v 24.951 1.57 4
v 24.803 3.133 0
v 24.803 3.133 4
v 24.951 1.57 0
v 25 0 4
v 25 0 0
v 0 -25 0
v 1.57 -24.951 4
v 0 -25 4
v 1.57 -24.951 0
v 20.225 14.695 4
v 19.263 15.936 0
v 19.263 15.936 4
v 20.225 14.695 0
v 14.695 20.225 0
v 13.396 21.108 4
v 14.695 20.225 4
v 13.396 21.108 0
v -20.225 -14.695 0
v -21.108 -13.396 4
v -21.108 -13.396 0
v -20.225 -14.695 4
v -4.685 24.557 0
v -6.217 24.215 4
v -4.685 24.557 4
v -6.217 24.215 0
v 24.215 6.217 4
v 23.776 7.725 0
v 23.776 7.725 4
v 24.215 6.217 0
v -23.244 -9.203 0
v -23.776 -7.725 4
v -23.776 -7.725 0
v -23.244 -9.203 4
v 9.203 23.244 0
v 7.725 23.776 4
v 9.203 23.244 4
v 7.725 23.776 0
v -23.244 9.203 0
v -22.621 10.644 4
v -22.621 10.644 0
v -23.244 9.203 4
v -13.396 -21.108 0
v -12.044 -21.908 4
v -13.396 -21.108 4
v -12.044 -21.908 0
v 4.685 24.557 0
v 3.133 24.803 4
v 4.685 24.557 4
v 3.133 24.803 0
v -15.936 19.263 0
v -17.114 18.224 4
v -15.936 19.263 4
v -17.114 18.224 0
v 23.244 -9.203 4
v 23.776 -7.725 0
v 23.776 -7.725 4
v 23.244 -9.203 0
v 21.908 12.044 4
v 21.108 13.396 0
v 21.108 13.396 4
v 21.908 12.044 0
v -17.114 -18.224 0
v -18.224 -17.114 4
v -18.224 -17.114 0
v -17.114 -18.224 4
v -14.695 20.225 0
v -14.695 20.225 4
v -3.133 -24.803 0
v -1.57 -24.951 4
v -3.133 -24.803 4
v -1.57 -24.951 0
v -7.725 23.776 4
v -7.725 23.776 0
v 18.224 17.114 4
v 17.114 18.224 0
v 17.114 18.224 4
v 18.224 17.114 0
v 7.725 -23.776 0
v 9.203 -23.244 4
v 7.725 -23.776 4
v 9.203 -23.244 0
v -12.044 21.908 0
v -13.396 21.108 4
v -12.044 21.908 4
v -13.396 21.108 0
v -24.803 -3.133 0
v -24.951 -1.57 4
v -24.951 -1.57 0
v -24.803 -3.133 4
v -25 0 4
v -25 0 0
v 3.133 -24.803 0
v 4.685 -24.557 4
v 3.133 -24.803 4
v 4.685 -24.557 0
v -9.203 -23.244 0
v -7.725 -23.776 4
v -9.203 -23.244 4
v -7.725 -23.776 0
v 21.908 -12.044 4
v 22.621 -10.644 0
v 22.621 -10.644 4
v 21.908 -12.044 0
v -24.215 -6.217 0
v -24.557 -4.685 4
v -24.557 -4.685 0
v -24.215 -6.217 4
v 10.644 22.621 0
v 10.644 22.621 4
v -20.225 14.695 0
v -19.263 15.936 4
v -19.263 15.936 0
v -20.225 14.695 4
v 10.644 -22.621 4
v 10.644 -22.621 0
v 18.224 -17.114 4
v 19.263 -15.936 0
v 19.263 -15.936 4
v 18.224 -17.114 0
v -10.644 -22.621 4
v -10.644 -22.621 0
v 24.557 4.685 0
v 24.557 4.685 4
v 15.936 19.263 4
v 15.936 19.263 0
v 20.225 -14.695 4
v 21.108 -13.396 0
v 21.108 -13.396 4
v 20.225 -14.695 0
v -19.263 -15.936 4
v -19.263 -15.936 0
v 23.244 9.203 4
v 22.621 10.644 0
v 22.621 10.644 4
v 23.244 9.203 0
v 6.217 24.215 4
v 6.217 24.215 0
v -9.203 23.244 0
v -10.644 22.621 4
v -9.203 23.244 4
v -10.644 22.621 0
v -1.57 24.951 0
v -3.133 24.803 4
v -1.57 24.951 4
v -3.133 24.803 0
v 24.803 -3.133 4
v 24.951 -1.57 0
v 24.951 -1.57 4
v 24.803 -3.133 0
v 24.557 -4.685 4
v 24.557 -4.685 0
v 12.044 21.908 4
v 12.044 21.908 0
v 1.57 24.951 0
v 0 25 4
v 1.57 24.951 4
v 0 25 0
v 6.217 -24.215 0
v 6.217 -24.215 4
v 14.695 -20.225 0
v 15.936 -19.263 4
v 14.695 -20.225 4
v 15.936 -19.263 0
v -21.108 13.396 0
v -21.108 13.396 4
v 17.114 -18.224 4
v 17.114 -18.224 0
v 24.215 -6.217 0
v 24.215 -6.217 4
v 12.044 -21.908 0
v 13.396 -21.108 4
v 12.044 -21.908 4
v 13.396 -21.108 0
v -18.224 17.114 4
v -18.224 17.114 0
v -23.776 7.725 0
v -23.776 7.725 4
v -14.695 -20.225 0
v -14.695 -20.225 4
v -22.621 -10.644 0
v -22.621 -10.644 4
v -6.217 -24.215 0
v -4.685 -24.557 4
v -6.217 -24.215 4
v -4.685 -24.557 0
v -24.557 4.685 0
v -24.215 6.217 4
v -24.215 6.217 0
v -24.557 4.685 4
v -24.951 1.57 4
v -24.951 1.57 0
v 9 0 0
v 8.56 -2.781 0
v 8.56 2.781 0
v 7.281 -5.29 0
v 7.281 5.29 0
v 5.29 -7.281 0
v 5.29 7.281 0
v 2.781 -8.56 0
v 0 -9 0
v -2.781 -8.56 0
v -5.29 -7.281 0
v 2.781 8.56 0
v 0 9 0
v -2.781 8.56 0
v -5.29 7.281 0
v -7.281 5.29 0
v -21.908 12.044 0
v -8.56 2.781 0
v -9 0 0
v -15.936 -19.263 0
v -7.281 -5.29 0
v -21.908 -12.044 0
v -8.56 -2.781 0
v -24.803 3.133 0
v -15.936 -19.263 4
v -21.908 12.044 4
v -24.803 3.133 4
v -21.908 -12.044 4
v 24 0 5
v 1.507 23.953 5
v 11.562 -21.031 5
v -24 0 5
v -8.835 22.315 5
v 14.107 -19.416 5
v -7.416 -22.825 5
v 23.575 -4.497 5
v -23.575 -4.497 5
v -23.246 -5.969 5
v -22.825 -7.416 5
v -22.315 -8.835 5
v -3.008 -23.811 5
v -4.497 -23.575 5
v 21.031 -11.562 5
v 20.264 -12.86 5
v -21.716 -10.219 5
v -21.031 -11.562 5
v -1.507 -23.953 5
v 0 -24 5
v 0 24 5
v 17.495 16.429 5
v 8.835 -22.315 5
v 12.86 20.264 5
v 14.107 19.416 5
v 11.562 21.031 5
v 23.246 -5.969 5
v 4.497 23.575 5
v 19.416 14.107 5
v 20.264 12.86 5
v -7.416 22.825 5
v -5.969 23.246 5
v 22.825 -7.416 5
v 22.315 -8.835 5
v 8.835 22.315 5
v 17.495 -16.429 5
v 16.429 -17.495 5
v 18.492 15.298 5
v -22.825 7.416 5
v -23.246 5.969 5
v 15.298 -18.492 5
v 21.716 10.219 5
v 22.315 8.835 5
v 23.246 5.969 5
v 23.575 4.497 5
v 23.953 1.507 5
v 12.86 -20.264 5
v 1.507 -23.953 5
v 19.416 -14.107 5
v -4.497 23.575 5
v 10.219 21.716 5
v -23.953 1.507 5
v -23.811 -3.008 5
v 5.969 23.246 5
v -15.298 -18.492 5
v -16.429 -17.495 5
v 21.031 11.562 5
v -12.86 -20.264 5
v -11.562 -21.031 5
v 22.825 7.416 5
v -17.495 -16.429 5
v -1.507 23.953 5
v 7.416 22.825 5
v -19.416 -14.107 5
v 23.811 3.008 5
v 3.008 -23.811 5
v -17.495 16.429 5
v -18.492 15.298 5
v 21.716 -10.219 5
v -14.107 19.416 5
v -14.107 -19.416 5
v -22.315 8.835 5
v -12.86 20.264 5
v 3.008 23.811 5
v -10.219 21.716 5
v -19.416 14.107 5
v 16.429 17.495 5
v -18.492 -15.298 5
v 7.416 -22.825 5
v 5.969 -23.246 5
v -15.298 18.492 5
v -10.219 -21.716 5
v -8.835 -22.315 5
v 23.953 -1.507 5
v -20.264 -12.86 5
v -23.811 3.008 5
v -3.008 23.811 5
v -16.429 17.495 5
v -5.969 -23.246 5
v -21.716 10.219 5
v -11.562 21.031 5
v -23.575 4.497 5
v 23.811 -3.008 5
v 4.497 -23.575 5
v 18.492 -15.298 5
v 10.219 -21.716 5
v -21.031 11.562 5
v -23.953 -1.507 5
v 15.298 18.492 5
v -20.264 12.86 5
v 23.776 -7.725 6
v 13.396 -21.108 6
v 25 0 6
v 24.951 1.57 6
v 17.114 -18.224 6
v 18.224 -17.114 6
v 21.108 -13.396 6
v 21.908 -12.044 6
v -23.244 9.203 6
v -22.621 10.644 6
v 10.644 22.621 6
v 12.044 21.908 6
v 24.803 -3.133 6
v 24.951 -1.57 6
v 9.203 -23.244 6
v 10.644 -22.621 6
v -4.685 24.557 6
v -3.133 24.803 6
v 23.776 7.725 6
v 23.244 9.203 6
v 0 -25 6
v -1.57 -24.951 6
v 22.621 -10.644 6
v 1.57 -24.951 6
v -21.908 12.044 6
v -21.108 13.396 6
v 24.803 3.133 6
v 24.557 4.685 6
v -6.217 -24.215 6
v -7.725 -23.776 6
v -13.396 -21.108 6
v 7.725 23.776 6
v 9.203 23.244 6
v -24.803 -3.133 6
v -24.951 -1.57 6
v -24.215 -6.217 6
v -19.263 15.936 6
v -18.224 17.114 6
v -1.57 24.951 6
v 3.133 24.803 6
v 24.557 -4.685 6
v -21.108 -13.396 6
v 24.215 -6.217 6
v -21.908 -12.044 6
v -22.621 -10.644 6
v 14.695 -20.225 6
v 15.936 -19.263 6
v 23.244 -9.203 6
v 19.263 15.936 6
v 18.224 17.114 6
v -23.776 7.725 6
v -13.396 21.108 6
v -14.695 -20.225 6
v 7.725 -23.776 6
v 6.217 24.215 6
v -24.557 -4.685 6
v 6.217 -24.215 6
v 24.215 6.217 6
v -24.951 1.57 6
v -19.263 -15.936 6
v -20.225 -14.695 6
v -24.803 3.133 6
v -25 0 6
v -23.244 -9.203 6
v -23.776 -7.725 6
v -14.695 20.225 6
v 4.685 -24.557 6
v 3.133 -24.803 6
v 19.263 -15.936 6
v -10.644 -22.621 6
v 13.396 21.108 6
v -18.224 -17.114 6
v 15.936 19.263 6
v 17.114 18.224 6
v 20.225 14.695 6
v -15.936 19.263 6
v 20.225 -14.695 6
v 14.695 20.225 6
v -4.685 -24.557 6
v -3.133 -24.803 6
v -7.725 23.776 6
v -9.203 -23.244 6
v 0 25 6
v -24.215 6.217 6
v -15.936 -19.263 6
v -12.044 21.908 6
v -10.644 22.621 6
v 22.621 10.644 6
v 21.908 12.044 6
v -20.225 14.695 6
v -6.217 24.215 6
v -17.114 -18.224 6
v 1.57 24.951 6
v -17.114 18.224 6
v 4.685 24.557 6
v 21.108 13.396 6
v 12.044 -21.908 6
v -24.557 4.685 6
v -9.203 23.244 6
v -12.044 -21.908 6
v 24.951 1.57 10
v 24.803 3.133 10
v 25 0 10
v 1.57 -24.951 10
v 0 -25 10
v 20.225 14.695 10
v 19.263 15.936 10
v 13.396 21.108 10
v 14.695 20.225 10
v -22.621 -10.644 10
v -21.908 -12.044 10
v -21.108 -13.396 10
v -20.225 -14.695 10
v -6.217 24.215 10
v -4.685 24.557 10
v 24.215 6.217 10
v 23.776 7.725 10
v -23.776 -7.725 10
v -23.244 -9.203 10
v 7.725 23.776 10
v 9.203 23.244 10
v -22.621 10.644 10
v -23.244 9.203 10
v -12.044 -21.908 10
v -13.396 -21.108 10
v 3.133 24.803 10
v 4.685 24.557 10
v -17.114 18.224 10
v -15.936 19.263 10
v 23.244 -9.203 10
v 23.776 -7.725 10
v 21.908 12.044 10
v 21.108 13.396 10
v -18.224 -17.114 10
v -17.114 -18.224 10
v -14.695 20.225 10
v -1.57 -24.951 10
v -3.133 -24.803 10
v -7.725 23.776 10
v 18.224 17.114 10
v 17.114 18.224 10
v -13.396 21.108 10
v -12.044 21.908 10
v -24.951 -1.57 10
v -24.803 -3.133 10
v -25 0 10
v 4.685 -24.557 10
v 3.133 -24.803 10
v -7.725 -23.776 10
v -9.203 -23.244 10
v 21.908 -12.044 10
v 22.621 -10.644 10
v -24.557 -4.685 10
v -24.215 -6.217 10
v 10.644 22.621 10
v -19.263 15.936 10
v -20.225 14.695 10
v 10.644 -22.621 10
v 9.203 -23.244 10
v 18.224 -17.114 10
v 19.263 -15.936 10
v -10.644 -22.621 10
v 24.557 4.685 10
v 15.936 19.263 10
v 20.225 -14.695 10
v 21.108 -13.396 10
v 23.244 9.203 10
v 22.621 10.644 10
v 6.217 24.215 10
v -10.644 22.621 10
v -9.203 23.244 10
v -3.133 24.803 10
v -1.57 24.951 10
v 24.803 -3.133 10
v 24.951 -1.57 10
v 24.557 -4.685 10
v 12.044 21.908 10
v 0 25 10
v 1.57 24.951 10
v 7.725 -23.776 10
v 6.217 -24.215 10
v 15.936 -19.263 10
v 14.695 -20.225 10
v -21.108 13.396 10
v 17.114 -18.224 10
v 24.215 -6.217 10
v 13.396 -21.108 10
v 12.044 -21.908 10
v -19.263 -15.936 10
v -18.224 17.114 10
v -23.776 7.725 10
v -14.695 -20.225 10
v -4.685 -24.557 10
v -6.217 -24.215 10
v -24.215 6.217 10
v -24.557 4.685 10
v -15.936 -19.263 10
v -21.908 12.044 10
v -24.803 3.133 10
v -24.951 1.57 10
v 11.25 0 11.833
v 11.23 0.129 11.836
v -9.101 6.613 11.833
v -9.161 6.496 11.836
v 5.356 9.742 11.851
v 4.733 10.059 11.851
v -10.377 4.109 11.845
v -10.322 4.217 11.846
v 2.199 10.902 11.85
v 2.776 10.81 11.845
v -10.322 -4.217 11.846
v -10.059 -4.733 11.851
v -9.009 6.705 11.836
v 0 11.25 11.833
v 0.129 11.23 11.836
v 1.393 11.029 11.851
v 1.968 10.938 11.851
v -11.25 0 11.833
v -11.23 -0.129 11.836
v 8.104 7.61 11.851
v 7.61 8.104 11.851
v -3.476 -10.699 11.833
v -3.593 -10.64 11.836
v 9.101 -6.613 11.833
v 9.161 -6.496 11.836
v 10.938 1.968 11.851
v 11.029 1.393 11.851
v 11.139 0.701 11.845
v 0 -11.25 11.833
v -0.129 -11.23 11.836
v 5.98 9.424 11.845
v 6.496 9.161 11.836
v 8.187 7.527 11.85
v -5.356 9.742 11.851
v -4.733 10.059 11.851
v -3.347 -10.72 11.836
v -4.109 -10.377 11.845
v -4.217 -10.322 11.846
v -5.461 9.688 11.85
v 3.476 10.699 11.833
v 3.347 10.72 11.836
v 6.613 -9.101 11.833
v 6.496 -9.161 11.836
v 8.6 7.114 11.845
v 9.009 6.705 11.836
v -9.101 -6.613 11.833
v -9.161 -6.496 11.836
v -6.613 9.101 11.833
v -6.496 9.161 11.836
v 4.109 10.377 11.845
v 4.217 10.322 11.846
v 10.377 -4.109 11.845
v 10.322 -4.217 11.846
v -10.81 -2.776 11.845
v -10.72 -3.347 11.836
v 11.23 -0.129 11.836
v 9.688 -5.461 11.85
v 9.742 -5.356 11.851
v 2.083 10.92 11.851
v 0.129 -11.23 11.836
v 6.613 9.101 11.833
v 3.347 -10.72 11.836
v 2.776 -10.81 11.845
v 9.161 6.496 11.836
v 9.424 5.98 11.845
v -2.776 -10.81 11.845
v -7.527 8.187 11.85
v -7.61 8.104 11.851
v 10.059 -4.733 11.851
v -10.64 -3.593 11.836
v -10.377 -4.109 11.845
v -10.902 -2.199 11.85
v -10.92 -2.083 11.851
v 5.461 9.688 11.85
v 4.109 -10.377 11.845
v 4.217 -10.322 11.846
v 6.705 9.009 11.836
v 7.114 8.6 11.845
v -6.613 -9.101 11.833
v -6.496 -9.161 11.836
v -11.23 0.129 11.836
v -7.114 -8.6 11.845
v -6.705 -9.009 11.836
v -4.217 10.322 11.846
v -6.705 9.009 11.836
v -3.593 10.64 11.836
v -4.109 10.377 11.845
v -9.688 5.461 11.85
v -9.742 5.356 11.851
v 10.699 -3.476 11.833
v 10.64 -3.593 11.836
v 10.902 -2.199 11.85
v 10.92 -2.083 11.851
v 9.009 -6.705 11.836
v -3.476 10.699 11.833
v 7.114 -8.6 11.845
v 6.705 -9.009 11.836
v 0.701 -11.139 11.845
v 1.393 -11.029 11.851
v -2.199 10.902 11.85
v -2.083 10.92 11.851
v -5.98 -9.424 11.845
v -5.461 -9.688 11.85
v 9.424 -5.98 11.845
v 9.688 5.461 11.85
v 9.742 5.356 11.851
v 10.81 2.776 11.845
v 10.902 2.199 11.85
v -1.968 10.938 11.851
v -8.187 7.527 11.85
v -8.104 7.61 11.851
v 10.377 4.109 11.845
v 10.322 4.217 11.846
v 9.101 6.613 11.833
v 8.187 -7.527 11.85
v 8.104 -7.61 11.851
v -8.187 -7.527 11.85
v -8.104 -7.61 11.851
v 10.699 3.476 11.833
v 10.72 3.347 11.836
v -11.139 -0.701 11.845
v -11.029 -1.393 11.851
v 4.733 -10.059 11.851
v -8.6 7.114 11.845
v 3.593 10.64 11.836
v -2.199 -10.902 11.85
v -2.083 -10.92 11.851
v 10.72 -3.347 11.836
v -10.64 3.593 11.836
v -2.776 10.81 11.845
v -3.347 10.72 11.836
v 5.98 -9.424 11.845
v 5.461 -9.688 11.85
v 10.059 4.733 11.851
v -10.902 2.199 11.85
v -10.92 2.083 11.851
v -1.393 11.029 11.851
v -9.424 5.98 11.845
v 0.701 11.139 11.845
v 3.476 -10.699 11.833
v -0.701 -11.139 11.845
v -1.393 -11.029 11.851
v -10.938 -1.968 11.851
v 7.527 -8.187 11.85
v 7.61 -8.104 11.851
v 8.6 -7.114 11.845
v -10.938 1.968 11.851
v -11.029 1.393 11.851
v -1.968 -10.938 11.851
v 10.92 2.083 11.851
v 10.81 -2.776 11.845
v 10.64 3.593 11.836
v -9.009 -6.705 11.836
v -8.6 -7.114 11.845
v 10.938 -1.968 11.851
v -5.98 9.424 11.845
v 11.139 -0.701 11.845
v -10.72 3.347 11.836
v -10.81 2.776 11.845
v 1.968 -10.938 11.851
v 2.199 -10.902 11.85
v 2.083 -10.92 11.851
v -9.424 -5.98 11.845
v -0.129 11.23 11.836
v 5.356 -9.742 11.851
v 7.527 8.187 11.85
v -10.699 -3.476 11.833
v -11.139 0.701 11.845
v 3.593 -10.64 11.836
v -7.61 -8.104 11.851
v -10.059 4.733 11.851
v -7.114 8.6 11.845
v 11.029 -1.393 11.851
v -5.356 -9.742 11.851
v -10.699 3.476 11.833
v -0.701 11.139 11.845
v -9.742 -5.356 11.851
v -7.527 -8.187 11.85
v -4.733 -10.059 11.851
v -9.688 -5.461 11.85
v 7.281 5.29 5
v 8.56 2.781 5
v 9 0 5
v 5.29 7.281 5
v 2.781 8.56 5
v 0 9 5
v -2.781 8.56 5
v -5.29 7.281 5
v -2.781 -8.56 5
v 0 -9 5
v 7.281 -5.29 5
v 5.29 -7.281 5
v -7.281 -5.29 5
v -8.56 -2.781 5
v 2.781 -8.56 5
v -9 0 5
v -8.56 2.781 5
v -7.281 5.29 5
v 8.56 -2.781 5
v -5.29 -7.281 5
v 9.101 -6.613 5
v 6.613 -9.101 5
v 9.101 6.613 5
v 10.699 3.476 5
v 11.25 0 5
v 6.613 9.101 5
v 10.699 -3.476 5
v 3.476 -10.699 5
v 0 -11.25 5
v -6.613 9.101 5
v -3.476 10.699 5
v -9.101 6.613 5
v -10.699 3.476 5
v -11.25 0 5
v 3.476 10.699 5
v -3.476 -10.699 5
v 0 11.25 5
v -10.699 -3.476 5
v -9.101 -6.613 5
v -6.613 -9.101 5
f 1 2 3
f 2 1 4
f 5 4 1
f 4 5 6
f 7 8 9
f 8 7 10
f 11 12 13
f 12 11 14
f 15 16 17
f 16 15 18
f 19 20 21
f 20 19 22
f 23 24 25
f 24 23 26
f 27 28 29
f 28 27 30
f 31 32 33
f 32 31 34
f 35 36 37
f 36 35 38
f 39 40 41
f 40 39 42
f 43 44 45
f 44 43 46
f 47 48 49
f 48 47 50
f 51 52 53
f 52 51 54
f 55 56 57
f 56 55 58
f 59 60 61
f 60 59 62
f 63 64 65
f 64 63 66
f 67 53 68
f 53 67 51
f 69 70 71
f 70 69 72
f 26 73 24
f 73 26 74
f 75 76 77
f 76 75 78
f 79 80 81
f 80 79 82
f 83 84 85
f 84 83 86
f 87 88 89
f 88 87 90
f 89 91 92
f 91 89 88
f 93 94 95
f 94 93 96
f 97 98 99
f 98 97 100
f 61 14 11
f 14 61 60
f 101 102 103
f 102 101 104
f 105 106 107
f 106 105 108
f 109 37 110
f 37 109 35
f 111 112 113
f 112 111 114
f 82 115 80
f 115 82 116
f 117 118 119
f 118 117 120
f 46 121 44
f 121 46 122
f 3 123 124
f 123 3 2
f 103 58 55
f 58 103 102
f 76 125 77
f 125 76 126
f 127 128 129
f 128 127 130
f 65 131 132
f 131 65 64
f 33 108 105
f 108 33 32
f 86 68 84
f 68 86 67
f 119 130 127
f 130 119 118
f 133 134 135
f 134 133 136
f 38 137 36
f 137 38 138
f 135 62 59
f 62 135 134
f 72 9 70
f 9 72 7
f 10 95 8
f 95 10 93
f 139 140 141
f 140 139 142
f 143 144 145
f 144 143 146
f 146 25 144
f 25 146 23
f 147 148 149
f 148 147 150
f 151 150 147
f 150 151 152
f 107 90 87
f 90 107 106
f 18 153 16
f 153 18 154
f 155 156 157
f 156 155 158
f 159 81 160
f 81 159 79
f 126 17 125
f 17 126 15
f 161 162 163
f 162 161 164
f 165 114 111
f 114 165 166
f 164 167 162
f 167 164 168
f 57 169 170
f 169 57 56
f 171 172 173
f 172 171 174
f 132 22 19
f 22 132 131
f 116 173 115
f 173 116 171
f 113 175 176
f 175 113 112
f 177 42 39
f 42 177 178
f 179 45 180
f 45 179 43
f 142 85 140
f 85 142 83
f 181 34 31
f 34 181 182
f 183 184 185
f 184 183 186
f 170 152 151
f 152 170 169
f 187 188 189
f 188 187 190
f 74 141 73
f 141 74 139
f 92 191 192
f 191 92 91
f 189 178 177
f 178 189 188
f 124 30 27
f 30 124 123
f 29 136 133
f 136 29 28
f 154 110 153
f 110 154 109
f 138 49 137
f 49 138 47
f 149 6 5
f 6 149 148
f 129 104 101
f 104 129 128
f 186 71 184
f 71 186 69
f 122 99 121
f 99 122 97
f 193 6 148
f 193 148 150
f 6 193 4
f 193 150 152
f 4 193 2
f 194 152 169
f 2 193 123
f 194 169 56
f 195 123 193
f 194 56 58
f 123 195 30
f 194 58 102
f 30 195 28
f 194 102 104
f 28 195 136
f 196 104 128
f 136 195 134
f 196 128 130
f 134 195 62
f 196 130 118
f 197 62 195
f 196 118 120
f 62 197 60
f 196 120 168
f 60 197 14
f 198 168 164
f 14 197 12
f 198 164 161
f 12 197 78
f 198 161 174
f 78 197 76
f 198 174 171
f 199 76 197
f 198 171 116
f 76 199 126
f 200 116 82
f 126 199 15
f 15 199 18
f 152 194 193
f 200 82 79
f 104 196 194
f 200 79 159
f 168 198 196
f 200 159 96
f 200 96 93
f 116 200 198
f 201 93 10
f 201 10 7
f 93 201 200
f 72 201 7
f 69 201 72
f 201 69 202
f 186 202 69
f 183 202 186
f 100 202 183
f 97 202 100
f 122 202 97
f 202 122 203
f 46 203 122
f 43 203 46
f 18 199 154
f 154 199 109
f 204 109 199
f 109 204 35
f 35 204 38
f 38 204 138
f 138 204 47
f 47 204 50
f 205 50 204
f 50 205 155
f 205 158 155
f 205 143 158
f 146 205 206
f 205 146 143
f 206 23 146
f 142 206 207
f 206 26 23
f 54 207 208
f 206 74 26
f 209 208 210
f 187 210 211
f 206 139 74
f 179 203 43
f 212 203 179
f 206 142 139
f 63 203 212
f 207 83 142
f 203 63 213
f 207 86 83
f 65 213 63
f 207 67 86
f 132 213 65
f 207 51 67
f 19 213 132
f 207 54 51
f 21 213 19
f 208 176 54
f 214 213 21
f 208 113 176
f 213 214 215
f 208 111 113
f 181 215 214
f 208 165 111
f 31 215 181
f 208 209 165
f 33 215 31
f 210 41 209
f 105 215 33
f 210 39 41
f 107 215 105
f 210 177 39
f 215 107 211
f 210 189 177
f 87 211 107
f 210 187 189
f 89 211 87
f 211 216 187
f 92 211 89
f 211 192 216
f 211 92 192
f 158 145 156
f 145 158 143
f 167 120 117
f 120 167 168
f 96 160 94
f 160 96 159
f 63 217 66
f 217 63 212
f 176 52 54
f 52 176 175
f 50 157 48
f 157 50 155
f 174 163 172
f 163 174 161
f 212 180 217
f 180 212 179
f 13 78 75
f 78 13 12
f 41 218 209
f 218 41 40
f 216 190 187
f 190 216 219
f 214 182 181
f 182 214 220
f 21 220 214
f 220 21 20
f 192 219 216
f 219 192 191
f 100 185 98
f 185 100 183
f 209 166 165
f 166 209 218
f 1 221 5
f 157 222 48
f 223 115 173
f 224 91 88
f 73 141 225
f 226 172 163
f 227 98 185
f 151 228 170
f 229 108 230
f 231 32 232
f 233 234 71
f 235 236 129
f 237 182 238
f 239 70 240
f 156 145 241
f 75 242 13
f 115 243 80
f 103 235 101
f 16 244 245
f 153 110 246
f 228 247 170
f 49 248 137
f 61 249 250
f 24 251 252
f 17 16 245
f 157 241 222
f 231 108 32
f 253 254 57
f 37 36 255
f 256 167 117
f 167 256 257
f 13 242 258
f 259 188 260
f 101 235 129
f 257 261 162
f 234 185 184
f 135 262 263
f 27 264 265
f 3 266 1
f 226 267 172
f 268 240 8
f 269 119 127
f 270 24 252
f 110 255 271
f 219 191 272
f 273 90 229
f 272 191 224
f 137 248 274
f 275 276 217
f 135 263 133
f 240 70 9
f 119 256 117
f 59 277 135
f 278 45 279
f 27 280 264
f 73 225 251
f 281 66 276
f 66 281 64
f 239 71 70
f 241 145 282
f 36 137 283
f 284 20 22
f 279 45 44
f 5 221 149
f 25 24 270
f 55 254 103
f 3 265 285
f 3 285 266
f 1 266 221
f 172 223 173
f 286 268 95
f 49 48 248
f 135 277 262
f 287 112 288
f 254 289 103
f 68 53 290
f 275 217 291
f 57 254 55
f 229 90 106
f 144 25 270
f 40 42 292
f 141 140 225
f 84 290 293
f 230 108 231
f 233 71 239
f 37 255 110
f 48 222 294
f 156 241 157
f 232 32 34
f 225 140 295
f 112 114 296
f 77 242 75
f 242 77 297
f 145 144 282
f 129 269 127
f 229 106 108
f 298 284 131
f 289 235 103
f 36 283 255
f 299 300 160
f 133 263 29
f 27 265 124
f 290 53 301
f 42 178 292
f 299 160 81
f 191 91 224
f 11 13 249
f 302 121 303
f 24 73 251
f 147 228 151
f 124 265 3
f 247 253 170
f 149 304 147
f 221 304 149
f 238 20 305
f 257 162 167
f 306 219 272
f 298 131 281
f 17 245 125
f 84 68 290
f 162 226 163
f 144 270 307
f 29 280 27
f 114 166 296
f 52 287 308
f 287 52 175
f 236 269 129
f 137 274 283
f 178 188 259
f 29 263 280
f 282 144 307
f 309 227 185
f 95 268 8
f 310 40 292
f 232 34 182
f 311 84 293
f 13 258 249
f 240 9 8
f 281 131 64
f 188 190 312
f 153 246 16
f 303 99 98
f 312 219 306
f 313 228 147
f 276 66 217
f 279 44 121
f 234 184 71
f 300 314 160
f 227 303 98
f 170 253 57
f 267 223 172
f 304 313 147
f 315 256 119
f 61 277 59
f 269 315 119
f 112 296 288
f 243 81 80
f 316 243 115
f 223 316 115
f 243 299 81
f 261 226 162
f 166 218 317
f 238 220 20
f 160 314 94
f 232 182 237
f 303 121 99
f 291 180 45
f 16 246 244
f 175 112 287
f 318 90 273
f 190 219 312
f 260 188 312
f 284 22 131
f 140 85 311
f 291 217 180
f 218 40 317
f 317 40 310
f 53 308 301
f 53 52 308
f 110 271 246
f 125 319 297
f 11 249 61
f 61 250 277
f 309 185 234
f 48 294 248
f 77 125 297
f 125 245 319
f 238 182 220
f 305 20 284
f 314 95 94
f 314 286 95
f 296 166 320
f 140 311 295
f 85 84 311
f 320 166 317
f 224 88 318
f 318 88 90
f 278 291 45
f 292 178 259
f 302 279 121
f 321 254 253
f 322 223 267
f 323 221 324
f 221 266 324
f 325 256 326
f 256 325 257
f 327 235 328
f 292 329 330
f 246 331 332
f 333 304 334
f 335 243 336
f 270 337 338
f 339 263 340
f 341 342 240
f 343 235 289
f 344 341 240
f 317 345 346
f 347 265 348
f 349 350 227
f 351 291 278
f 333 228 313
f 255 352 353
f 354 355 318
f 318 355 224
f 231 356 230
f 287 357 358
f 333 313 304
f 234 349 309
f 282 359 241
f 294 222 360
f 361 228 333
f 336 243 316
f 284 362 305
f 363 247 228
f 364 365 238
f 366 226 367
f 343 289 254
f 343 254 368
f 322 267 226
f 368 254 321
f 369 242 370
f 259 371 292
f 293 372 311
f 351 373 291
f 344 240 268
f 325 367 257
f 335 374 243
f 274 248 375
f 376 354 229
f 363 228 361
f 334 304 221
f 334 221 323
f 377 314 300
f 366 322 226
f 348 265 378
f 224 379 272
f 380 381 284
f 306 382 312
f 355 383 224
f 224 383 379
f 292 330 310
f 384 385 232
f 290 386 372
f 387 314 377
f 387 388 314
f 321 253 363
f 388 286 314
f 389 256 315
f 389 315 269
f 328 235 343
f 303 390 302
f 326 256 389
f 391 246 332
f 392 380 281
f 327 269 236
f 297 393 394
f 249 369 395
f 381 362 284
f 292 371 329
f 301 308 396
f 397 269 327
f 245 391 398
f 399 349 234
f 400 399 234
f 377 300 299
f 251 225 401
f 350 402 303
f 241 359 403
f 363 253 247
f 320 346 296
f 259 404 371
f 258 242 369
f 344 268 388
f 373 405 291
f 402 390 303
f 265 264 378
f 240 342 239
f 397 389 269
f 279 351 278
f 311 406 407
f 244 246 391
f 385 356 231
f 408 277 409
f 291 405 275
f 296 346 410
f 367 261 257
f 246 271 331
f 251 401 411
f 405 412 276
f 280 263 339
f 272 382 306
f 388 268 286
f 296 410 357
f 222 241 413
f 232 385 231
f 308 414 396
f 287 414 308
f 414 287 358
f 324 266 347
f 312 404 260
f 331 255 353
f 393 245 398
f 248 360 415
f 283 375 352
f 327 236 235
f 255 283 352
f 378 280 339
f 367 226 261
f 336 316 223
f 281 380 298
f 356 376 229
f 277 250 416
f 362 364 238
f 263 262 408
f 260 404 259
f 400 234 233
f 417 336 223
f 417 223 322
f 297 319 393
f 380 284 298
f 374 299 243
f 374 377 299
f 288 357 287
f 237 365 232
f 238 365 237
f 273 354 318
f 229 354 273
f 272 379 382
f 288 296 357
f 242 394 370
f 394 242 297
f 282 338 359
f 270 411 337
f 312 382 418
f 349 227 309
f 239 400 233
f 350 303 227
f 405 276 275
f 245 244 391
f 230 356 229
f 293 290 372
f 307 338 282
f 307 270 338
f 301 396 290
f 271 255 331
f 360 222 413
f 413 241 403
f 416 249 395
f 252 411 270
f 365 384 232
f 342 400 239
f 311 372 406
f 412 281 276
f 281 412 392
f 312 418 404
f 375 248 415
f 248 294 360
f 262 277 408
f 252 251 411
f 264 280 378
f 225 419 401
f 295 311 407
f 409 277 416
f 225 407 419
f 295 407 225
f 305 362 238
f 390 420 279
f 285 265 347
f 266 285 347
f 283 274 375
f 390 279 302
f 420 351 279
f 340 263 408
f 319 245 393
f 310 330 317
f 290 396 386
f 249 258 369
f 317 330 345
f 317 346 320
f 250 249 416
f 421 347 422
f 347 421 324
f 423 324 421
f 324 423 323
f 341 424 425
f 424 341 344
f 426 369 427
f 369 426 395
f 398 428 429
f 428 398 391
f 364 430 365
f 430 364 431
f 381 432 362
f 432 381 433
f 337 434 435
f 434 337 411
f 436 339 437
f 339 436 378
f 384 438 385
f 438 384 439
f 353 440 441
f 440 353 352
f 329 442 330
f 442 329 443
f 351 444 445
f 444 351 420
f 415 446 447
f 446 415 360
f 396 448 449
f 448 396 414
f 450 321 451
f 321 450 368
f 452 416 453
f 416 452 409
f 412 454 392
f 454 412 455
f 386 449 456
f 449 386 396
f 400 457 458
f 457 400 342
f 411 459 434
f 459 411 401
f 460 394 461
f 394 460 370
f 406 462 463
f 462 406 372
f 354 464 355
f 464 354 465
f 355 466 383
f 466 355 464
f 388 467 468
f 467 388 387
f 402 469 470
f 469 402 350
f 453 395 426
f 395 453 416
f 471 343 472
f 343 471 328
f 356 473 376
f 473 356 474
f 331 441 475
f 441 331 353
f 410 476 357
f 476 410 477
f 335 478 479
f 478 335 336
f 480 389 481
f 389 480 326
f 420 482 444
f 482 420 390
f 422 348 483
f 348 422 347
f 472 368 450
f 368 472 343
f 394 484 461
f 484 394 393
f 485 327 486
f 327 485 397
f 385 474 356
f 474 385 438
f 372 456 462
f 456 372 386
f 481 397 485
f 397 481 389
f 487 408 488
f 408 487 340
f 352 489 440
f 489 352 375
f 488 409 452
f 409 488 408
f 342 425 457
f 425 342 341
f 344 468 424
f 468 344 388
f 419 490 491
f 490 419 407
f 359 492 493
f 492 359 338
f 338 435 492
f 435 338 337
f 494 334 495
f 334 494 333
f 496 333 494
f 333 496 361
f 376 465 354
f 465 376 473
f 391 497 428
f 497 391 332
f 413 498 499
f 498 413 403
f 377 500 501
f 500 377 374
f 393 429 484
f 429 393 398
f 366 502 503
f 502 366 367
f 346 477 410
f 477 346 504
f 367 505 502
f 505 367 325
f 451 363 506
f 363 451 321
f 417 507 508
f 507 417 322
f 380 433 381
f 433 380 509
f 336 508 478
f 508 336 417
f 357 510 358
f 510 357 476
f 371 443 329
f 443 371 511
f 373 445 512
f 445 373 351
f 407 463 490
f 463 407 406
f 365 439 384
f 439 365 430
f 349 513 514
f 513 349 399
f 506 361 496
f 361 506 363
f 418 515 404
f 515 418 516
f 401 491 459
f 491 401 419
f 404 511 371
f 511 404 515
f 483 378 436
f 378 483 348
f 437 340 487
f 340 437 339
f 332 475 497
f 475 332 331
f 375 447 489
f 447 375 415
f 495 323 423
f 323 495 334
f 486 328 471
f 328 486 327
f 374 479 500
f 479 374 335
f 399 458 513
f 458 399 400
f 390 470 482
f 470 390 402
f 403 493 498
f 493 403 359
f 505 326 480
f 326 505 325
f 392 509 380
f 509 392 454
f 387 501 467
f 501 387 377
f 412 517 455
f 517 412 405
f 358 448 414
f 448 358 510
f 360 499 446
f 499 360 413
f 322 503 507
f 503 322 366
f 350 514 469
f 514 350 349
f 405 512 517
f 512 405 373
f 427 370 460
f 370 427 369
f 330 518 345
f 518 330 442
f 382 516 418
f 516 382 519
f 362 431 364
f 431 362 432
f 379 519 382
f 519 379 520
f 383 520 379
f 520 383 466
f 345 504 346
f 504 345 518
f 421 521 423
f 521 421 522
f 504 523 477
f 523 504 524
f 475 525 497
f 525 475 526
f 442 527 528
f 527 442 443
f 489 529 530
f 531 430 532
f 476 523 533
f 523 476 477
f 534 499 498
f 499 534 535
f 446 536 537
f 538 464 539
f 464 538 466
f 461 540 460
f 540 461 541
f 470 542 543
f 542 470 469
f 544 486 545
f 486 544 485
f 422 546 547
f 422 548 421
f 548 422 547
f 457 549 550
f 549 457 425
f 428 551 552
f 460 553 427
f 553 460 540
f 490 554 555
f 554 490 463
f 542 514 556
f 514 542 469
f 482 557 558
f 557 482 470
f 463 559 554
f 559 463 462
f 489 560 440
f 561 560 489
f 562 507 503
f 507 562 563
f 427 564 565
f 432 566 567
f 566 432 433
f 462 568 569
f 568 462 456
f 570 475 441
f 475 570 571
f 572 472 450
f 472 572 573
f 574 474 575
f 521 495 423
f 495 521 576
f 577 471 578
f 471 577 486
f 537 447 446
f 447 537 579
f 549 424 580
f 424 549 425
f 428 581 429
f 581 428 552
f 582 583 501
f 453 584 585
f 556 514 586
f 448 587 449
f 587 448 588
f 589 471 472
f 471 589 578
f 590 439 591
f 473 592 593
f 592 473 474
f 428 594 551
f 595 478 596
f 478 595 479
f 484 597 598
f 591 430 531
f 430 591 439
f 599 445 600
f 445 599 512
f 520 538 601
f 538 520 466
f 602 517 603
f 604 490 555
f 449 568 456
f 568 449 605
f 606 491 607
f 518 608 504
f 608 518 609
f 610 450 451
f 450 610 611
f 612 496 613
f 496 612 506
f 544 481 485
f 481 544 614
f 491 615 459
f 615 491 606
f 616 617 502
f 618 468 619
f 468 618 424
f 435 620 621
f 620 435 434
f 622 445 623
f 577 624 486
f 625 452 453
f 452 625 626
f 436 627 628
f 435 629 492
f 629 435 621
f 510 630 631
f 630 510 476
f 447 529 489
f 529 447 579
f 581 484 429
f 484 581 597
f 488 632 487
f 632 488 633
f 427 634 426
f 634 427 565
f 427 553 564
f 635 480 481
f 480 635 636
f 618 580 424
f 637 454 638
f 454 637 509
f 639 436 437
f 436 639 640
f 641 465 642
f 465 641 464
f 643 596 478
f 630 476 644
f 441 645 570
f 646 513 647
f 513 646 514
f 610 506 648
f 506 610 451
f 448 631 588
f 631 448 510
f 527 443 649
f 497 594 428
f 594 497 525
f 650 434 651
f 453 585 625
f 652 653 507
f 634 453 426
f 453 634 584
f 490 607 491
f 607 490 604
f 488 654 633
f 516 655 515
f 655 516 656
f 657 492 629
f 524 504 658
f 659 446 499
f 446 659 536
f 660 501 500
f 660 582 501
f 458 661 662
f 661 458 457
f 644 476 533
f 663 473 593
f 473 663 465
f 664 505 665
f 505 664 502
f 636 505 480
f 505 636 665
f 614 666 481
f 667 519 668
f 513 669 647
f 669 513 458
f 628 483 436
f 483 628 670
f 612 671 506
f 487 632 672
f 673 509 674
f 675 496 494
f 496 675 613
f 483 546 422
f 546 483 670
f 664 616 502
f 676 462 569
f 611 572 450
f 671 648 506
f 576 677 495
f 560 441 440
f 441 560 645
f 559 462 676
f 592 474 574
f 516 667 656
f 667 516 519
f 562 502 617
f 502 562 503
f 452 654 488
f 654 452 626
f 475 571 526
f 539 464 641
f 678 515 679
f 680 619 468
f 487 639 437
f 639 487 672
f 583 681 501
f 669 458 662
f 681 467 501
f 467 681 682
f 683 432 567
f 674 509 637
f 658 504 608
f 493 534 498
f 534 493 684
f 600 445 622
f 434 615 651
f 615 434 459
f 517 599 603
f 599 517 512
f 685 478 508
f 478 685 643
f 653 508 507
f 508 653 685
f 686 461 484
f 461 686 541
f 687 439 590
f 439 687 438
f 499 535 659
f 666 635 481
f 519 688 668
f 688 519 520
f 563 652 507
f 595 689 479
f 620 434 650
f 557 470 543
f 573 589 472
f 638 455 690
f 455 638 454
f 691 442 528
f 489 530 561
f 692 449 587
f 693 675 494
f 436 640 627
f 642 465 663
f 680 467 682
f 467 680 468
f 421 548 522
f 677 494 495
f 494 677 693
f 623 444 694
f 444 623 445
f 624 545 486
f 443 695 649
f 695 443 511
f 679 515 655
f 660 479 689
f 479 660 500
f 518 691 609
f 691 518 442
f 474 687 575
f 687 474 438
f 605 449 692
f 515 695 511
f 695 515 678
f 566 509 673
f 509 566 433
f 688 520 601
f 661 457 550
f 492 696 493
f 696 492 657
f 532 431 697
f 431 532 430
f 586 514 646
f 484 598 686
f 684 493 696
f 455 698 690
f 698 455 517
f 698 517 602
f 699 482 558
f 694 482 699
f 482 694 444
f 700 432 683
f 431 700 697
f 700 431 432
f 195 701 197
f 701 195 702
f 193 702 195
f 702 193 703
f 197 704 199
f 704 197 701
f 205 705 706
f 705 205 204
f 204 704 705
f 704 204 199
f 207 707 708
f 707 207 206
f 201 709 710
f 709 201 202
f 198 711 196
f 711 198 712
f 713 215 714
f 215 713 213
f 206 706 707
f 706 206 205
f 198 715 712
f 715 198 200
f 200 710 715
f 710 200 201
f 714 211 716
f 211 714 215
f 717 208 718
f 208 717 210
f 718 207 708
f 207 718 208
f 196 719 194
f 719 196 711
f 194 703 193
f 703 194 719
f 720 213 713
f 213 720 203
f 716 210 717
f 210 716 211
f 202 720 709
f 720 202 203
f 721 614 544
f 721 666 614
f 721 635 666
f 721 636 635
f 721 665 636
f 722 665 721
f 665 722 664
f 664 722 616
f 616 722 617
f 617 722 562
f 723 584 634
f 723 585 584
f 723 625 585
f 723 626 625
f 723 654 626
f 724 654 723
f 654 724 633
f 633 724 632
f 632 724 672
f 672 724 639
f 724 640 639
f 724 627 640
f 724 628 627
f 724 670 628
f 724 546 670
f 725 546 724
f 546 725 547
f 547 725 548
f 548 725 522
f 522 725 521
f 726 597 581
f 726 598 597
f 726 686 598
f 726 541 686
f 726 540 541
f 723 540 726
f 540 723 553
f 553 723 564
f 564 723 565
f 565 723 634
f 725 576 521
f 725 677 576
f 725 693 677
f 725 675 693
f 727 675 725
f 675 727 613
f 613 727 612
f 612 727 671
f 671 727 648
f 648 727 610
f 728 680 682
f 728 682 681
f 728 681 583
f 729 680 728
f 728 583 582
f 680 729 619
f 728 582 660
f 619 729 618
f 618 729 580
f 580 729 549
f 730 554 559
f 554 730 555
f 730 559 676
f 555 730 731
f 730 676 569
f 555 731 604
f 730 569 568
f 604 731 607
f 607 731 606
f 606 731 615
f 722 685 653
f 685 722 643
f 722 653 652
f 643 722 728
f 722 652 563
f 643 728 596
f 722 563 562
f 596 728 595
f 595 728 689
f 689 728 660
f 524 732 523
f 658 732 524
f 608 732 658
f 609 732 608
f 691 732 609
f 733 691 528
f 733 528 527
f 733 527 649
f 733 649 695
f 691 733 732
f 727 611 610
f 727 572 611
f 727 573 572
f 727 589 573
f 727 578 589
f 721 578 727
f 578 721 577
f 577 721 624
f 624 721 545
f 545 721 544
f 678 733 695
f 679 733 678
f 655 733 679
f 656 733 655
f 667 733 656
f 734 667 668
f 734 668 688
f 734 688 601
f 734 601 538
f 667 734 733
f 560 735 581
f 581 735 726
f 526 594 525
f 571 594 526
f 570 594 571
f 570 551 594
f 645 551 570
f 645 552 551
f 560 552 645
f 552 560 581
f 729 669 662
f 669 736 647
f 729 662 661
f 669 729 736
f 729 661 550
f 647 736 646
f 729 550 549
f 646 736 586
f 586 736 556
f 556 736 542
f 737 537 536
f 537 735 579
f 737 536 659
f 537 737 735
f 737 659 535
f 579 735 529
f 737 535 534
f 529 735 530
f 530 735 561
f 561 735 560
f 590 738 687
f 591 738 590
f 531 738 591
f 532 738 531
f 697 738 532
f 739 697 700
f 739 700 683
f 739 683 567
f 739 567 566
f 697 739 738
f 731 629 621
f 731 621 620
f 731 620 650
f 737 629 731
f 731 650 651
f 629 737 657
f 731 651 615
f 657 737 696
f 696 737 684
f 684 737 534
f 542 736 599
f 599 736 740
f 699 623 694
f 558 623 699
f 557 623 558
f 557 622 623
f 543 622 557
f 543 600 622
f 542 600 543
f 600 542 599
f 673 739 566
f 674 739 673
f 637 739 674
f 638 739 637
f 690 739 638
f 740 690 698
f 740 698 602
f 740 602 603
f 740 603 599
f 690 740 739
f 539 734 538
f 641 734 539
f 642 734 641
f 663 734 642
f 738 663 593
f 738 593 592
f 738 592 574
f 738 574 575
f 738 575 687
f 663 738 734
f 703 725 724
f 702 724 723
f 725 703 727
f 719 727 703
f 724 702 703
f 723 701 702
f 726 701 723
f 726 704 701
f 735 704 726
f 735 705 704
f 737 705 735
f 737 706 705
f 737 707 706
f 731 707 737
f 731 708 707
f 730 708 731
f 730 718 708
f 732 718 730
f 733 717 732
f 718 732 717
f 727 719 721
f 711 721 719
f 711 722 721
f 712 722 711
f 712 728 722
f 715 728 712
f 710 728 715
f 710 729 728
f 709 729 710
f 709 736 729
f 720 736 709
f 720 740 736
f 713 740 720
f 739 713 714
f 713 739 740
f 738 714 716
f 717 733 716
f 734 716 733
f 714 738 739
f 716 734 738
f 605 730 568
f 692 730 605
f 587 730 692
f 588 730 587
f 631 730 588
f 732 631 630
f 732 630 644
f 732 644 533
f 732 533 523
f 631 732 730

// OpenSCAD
//RUEDA con radios 
//parametros rueda

//medidas del aro externo de la rueda.
diametro=50; //diametro externo de la rueda. influye en la velocidad.
grosor=4+6;	// grosor del aro externo de la rueda
altura_hub=7;
altura_bisel=2;

//medidas de los radios
//grosor_radios=8; //grosor o altura de los radios

//medidas del hub central
//diam_eje=4;  //eje central por el que pasa el tornillo de izquierdas


hub=false;
//medidas de los agujeros del hub
metrica_hub=3;

module rueda(gros=grosor, diam=diametro)
{	


	difference(){
		
				
				union(){
					cylinder (r=diam/2 ,h=gros/2-1, $fn=100);

					translate([0,0,grosor/2-1])
					cylinder (r1=diam/2, r2=(diam-2)/2,h=1, $fn=100);

					translate([0,0,grosor/2])
					cylinder (r2=diam/2, r1=(diam-2)/2,h=1, $fn=100);
					
					translate([0,0,grosor/2+1])
					cylinder (r=diam/2 ,h=gros/2-1, $fn=100);

					translate([0,0,grosor])
					cylinder (r1=diam/2,r2=20/2, h=altura_bisel, $fn=100);
					if (hub==true){
						translate([0,0,grosor])
						cylinder (r=20/2, h=altura_hub, $fn=100);
					}
					
				}
				
				
				
				if (hub==true){
					cylinder (r=14/2, h=100, $fn=20, center=true);
					translate([0,0,0])
					cylinder (r=22.5/2, h=7, $fn=20);
				}
				else{
					cylinder (r=18/2, h=100, $fn=20, center=true);
					translate([0,0,grosor+altura_bisel-7])
					cylinder (r=22.5/2, h=7, $fn=20);
				}

				

				//translate([8,0,0])
				//cylinder (r=3.5/2, h=100, $fn=20, center=true);
				//translate([-8,0,0])
				//cylinder (r=3.5/2, h=100, $fn=20, center=true);
			
	}//fin diference
}

				//translate([diametro/2-10,0,grosor])
				//cube ([10,10,10]);


	
	rueda();
	
	

	




	
